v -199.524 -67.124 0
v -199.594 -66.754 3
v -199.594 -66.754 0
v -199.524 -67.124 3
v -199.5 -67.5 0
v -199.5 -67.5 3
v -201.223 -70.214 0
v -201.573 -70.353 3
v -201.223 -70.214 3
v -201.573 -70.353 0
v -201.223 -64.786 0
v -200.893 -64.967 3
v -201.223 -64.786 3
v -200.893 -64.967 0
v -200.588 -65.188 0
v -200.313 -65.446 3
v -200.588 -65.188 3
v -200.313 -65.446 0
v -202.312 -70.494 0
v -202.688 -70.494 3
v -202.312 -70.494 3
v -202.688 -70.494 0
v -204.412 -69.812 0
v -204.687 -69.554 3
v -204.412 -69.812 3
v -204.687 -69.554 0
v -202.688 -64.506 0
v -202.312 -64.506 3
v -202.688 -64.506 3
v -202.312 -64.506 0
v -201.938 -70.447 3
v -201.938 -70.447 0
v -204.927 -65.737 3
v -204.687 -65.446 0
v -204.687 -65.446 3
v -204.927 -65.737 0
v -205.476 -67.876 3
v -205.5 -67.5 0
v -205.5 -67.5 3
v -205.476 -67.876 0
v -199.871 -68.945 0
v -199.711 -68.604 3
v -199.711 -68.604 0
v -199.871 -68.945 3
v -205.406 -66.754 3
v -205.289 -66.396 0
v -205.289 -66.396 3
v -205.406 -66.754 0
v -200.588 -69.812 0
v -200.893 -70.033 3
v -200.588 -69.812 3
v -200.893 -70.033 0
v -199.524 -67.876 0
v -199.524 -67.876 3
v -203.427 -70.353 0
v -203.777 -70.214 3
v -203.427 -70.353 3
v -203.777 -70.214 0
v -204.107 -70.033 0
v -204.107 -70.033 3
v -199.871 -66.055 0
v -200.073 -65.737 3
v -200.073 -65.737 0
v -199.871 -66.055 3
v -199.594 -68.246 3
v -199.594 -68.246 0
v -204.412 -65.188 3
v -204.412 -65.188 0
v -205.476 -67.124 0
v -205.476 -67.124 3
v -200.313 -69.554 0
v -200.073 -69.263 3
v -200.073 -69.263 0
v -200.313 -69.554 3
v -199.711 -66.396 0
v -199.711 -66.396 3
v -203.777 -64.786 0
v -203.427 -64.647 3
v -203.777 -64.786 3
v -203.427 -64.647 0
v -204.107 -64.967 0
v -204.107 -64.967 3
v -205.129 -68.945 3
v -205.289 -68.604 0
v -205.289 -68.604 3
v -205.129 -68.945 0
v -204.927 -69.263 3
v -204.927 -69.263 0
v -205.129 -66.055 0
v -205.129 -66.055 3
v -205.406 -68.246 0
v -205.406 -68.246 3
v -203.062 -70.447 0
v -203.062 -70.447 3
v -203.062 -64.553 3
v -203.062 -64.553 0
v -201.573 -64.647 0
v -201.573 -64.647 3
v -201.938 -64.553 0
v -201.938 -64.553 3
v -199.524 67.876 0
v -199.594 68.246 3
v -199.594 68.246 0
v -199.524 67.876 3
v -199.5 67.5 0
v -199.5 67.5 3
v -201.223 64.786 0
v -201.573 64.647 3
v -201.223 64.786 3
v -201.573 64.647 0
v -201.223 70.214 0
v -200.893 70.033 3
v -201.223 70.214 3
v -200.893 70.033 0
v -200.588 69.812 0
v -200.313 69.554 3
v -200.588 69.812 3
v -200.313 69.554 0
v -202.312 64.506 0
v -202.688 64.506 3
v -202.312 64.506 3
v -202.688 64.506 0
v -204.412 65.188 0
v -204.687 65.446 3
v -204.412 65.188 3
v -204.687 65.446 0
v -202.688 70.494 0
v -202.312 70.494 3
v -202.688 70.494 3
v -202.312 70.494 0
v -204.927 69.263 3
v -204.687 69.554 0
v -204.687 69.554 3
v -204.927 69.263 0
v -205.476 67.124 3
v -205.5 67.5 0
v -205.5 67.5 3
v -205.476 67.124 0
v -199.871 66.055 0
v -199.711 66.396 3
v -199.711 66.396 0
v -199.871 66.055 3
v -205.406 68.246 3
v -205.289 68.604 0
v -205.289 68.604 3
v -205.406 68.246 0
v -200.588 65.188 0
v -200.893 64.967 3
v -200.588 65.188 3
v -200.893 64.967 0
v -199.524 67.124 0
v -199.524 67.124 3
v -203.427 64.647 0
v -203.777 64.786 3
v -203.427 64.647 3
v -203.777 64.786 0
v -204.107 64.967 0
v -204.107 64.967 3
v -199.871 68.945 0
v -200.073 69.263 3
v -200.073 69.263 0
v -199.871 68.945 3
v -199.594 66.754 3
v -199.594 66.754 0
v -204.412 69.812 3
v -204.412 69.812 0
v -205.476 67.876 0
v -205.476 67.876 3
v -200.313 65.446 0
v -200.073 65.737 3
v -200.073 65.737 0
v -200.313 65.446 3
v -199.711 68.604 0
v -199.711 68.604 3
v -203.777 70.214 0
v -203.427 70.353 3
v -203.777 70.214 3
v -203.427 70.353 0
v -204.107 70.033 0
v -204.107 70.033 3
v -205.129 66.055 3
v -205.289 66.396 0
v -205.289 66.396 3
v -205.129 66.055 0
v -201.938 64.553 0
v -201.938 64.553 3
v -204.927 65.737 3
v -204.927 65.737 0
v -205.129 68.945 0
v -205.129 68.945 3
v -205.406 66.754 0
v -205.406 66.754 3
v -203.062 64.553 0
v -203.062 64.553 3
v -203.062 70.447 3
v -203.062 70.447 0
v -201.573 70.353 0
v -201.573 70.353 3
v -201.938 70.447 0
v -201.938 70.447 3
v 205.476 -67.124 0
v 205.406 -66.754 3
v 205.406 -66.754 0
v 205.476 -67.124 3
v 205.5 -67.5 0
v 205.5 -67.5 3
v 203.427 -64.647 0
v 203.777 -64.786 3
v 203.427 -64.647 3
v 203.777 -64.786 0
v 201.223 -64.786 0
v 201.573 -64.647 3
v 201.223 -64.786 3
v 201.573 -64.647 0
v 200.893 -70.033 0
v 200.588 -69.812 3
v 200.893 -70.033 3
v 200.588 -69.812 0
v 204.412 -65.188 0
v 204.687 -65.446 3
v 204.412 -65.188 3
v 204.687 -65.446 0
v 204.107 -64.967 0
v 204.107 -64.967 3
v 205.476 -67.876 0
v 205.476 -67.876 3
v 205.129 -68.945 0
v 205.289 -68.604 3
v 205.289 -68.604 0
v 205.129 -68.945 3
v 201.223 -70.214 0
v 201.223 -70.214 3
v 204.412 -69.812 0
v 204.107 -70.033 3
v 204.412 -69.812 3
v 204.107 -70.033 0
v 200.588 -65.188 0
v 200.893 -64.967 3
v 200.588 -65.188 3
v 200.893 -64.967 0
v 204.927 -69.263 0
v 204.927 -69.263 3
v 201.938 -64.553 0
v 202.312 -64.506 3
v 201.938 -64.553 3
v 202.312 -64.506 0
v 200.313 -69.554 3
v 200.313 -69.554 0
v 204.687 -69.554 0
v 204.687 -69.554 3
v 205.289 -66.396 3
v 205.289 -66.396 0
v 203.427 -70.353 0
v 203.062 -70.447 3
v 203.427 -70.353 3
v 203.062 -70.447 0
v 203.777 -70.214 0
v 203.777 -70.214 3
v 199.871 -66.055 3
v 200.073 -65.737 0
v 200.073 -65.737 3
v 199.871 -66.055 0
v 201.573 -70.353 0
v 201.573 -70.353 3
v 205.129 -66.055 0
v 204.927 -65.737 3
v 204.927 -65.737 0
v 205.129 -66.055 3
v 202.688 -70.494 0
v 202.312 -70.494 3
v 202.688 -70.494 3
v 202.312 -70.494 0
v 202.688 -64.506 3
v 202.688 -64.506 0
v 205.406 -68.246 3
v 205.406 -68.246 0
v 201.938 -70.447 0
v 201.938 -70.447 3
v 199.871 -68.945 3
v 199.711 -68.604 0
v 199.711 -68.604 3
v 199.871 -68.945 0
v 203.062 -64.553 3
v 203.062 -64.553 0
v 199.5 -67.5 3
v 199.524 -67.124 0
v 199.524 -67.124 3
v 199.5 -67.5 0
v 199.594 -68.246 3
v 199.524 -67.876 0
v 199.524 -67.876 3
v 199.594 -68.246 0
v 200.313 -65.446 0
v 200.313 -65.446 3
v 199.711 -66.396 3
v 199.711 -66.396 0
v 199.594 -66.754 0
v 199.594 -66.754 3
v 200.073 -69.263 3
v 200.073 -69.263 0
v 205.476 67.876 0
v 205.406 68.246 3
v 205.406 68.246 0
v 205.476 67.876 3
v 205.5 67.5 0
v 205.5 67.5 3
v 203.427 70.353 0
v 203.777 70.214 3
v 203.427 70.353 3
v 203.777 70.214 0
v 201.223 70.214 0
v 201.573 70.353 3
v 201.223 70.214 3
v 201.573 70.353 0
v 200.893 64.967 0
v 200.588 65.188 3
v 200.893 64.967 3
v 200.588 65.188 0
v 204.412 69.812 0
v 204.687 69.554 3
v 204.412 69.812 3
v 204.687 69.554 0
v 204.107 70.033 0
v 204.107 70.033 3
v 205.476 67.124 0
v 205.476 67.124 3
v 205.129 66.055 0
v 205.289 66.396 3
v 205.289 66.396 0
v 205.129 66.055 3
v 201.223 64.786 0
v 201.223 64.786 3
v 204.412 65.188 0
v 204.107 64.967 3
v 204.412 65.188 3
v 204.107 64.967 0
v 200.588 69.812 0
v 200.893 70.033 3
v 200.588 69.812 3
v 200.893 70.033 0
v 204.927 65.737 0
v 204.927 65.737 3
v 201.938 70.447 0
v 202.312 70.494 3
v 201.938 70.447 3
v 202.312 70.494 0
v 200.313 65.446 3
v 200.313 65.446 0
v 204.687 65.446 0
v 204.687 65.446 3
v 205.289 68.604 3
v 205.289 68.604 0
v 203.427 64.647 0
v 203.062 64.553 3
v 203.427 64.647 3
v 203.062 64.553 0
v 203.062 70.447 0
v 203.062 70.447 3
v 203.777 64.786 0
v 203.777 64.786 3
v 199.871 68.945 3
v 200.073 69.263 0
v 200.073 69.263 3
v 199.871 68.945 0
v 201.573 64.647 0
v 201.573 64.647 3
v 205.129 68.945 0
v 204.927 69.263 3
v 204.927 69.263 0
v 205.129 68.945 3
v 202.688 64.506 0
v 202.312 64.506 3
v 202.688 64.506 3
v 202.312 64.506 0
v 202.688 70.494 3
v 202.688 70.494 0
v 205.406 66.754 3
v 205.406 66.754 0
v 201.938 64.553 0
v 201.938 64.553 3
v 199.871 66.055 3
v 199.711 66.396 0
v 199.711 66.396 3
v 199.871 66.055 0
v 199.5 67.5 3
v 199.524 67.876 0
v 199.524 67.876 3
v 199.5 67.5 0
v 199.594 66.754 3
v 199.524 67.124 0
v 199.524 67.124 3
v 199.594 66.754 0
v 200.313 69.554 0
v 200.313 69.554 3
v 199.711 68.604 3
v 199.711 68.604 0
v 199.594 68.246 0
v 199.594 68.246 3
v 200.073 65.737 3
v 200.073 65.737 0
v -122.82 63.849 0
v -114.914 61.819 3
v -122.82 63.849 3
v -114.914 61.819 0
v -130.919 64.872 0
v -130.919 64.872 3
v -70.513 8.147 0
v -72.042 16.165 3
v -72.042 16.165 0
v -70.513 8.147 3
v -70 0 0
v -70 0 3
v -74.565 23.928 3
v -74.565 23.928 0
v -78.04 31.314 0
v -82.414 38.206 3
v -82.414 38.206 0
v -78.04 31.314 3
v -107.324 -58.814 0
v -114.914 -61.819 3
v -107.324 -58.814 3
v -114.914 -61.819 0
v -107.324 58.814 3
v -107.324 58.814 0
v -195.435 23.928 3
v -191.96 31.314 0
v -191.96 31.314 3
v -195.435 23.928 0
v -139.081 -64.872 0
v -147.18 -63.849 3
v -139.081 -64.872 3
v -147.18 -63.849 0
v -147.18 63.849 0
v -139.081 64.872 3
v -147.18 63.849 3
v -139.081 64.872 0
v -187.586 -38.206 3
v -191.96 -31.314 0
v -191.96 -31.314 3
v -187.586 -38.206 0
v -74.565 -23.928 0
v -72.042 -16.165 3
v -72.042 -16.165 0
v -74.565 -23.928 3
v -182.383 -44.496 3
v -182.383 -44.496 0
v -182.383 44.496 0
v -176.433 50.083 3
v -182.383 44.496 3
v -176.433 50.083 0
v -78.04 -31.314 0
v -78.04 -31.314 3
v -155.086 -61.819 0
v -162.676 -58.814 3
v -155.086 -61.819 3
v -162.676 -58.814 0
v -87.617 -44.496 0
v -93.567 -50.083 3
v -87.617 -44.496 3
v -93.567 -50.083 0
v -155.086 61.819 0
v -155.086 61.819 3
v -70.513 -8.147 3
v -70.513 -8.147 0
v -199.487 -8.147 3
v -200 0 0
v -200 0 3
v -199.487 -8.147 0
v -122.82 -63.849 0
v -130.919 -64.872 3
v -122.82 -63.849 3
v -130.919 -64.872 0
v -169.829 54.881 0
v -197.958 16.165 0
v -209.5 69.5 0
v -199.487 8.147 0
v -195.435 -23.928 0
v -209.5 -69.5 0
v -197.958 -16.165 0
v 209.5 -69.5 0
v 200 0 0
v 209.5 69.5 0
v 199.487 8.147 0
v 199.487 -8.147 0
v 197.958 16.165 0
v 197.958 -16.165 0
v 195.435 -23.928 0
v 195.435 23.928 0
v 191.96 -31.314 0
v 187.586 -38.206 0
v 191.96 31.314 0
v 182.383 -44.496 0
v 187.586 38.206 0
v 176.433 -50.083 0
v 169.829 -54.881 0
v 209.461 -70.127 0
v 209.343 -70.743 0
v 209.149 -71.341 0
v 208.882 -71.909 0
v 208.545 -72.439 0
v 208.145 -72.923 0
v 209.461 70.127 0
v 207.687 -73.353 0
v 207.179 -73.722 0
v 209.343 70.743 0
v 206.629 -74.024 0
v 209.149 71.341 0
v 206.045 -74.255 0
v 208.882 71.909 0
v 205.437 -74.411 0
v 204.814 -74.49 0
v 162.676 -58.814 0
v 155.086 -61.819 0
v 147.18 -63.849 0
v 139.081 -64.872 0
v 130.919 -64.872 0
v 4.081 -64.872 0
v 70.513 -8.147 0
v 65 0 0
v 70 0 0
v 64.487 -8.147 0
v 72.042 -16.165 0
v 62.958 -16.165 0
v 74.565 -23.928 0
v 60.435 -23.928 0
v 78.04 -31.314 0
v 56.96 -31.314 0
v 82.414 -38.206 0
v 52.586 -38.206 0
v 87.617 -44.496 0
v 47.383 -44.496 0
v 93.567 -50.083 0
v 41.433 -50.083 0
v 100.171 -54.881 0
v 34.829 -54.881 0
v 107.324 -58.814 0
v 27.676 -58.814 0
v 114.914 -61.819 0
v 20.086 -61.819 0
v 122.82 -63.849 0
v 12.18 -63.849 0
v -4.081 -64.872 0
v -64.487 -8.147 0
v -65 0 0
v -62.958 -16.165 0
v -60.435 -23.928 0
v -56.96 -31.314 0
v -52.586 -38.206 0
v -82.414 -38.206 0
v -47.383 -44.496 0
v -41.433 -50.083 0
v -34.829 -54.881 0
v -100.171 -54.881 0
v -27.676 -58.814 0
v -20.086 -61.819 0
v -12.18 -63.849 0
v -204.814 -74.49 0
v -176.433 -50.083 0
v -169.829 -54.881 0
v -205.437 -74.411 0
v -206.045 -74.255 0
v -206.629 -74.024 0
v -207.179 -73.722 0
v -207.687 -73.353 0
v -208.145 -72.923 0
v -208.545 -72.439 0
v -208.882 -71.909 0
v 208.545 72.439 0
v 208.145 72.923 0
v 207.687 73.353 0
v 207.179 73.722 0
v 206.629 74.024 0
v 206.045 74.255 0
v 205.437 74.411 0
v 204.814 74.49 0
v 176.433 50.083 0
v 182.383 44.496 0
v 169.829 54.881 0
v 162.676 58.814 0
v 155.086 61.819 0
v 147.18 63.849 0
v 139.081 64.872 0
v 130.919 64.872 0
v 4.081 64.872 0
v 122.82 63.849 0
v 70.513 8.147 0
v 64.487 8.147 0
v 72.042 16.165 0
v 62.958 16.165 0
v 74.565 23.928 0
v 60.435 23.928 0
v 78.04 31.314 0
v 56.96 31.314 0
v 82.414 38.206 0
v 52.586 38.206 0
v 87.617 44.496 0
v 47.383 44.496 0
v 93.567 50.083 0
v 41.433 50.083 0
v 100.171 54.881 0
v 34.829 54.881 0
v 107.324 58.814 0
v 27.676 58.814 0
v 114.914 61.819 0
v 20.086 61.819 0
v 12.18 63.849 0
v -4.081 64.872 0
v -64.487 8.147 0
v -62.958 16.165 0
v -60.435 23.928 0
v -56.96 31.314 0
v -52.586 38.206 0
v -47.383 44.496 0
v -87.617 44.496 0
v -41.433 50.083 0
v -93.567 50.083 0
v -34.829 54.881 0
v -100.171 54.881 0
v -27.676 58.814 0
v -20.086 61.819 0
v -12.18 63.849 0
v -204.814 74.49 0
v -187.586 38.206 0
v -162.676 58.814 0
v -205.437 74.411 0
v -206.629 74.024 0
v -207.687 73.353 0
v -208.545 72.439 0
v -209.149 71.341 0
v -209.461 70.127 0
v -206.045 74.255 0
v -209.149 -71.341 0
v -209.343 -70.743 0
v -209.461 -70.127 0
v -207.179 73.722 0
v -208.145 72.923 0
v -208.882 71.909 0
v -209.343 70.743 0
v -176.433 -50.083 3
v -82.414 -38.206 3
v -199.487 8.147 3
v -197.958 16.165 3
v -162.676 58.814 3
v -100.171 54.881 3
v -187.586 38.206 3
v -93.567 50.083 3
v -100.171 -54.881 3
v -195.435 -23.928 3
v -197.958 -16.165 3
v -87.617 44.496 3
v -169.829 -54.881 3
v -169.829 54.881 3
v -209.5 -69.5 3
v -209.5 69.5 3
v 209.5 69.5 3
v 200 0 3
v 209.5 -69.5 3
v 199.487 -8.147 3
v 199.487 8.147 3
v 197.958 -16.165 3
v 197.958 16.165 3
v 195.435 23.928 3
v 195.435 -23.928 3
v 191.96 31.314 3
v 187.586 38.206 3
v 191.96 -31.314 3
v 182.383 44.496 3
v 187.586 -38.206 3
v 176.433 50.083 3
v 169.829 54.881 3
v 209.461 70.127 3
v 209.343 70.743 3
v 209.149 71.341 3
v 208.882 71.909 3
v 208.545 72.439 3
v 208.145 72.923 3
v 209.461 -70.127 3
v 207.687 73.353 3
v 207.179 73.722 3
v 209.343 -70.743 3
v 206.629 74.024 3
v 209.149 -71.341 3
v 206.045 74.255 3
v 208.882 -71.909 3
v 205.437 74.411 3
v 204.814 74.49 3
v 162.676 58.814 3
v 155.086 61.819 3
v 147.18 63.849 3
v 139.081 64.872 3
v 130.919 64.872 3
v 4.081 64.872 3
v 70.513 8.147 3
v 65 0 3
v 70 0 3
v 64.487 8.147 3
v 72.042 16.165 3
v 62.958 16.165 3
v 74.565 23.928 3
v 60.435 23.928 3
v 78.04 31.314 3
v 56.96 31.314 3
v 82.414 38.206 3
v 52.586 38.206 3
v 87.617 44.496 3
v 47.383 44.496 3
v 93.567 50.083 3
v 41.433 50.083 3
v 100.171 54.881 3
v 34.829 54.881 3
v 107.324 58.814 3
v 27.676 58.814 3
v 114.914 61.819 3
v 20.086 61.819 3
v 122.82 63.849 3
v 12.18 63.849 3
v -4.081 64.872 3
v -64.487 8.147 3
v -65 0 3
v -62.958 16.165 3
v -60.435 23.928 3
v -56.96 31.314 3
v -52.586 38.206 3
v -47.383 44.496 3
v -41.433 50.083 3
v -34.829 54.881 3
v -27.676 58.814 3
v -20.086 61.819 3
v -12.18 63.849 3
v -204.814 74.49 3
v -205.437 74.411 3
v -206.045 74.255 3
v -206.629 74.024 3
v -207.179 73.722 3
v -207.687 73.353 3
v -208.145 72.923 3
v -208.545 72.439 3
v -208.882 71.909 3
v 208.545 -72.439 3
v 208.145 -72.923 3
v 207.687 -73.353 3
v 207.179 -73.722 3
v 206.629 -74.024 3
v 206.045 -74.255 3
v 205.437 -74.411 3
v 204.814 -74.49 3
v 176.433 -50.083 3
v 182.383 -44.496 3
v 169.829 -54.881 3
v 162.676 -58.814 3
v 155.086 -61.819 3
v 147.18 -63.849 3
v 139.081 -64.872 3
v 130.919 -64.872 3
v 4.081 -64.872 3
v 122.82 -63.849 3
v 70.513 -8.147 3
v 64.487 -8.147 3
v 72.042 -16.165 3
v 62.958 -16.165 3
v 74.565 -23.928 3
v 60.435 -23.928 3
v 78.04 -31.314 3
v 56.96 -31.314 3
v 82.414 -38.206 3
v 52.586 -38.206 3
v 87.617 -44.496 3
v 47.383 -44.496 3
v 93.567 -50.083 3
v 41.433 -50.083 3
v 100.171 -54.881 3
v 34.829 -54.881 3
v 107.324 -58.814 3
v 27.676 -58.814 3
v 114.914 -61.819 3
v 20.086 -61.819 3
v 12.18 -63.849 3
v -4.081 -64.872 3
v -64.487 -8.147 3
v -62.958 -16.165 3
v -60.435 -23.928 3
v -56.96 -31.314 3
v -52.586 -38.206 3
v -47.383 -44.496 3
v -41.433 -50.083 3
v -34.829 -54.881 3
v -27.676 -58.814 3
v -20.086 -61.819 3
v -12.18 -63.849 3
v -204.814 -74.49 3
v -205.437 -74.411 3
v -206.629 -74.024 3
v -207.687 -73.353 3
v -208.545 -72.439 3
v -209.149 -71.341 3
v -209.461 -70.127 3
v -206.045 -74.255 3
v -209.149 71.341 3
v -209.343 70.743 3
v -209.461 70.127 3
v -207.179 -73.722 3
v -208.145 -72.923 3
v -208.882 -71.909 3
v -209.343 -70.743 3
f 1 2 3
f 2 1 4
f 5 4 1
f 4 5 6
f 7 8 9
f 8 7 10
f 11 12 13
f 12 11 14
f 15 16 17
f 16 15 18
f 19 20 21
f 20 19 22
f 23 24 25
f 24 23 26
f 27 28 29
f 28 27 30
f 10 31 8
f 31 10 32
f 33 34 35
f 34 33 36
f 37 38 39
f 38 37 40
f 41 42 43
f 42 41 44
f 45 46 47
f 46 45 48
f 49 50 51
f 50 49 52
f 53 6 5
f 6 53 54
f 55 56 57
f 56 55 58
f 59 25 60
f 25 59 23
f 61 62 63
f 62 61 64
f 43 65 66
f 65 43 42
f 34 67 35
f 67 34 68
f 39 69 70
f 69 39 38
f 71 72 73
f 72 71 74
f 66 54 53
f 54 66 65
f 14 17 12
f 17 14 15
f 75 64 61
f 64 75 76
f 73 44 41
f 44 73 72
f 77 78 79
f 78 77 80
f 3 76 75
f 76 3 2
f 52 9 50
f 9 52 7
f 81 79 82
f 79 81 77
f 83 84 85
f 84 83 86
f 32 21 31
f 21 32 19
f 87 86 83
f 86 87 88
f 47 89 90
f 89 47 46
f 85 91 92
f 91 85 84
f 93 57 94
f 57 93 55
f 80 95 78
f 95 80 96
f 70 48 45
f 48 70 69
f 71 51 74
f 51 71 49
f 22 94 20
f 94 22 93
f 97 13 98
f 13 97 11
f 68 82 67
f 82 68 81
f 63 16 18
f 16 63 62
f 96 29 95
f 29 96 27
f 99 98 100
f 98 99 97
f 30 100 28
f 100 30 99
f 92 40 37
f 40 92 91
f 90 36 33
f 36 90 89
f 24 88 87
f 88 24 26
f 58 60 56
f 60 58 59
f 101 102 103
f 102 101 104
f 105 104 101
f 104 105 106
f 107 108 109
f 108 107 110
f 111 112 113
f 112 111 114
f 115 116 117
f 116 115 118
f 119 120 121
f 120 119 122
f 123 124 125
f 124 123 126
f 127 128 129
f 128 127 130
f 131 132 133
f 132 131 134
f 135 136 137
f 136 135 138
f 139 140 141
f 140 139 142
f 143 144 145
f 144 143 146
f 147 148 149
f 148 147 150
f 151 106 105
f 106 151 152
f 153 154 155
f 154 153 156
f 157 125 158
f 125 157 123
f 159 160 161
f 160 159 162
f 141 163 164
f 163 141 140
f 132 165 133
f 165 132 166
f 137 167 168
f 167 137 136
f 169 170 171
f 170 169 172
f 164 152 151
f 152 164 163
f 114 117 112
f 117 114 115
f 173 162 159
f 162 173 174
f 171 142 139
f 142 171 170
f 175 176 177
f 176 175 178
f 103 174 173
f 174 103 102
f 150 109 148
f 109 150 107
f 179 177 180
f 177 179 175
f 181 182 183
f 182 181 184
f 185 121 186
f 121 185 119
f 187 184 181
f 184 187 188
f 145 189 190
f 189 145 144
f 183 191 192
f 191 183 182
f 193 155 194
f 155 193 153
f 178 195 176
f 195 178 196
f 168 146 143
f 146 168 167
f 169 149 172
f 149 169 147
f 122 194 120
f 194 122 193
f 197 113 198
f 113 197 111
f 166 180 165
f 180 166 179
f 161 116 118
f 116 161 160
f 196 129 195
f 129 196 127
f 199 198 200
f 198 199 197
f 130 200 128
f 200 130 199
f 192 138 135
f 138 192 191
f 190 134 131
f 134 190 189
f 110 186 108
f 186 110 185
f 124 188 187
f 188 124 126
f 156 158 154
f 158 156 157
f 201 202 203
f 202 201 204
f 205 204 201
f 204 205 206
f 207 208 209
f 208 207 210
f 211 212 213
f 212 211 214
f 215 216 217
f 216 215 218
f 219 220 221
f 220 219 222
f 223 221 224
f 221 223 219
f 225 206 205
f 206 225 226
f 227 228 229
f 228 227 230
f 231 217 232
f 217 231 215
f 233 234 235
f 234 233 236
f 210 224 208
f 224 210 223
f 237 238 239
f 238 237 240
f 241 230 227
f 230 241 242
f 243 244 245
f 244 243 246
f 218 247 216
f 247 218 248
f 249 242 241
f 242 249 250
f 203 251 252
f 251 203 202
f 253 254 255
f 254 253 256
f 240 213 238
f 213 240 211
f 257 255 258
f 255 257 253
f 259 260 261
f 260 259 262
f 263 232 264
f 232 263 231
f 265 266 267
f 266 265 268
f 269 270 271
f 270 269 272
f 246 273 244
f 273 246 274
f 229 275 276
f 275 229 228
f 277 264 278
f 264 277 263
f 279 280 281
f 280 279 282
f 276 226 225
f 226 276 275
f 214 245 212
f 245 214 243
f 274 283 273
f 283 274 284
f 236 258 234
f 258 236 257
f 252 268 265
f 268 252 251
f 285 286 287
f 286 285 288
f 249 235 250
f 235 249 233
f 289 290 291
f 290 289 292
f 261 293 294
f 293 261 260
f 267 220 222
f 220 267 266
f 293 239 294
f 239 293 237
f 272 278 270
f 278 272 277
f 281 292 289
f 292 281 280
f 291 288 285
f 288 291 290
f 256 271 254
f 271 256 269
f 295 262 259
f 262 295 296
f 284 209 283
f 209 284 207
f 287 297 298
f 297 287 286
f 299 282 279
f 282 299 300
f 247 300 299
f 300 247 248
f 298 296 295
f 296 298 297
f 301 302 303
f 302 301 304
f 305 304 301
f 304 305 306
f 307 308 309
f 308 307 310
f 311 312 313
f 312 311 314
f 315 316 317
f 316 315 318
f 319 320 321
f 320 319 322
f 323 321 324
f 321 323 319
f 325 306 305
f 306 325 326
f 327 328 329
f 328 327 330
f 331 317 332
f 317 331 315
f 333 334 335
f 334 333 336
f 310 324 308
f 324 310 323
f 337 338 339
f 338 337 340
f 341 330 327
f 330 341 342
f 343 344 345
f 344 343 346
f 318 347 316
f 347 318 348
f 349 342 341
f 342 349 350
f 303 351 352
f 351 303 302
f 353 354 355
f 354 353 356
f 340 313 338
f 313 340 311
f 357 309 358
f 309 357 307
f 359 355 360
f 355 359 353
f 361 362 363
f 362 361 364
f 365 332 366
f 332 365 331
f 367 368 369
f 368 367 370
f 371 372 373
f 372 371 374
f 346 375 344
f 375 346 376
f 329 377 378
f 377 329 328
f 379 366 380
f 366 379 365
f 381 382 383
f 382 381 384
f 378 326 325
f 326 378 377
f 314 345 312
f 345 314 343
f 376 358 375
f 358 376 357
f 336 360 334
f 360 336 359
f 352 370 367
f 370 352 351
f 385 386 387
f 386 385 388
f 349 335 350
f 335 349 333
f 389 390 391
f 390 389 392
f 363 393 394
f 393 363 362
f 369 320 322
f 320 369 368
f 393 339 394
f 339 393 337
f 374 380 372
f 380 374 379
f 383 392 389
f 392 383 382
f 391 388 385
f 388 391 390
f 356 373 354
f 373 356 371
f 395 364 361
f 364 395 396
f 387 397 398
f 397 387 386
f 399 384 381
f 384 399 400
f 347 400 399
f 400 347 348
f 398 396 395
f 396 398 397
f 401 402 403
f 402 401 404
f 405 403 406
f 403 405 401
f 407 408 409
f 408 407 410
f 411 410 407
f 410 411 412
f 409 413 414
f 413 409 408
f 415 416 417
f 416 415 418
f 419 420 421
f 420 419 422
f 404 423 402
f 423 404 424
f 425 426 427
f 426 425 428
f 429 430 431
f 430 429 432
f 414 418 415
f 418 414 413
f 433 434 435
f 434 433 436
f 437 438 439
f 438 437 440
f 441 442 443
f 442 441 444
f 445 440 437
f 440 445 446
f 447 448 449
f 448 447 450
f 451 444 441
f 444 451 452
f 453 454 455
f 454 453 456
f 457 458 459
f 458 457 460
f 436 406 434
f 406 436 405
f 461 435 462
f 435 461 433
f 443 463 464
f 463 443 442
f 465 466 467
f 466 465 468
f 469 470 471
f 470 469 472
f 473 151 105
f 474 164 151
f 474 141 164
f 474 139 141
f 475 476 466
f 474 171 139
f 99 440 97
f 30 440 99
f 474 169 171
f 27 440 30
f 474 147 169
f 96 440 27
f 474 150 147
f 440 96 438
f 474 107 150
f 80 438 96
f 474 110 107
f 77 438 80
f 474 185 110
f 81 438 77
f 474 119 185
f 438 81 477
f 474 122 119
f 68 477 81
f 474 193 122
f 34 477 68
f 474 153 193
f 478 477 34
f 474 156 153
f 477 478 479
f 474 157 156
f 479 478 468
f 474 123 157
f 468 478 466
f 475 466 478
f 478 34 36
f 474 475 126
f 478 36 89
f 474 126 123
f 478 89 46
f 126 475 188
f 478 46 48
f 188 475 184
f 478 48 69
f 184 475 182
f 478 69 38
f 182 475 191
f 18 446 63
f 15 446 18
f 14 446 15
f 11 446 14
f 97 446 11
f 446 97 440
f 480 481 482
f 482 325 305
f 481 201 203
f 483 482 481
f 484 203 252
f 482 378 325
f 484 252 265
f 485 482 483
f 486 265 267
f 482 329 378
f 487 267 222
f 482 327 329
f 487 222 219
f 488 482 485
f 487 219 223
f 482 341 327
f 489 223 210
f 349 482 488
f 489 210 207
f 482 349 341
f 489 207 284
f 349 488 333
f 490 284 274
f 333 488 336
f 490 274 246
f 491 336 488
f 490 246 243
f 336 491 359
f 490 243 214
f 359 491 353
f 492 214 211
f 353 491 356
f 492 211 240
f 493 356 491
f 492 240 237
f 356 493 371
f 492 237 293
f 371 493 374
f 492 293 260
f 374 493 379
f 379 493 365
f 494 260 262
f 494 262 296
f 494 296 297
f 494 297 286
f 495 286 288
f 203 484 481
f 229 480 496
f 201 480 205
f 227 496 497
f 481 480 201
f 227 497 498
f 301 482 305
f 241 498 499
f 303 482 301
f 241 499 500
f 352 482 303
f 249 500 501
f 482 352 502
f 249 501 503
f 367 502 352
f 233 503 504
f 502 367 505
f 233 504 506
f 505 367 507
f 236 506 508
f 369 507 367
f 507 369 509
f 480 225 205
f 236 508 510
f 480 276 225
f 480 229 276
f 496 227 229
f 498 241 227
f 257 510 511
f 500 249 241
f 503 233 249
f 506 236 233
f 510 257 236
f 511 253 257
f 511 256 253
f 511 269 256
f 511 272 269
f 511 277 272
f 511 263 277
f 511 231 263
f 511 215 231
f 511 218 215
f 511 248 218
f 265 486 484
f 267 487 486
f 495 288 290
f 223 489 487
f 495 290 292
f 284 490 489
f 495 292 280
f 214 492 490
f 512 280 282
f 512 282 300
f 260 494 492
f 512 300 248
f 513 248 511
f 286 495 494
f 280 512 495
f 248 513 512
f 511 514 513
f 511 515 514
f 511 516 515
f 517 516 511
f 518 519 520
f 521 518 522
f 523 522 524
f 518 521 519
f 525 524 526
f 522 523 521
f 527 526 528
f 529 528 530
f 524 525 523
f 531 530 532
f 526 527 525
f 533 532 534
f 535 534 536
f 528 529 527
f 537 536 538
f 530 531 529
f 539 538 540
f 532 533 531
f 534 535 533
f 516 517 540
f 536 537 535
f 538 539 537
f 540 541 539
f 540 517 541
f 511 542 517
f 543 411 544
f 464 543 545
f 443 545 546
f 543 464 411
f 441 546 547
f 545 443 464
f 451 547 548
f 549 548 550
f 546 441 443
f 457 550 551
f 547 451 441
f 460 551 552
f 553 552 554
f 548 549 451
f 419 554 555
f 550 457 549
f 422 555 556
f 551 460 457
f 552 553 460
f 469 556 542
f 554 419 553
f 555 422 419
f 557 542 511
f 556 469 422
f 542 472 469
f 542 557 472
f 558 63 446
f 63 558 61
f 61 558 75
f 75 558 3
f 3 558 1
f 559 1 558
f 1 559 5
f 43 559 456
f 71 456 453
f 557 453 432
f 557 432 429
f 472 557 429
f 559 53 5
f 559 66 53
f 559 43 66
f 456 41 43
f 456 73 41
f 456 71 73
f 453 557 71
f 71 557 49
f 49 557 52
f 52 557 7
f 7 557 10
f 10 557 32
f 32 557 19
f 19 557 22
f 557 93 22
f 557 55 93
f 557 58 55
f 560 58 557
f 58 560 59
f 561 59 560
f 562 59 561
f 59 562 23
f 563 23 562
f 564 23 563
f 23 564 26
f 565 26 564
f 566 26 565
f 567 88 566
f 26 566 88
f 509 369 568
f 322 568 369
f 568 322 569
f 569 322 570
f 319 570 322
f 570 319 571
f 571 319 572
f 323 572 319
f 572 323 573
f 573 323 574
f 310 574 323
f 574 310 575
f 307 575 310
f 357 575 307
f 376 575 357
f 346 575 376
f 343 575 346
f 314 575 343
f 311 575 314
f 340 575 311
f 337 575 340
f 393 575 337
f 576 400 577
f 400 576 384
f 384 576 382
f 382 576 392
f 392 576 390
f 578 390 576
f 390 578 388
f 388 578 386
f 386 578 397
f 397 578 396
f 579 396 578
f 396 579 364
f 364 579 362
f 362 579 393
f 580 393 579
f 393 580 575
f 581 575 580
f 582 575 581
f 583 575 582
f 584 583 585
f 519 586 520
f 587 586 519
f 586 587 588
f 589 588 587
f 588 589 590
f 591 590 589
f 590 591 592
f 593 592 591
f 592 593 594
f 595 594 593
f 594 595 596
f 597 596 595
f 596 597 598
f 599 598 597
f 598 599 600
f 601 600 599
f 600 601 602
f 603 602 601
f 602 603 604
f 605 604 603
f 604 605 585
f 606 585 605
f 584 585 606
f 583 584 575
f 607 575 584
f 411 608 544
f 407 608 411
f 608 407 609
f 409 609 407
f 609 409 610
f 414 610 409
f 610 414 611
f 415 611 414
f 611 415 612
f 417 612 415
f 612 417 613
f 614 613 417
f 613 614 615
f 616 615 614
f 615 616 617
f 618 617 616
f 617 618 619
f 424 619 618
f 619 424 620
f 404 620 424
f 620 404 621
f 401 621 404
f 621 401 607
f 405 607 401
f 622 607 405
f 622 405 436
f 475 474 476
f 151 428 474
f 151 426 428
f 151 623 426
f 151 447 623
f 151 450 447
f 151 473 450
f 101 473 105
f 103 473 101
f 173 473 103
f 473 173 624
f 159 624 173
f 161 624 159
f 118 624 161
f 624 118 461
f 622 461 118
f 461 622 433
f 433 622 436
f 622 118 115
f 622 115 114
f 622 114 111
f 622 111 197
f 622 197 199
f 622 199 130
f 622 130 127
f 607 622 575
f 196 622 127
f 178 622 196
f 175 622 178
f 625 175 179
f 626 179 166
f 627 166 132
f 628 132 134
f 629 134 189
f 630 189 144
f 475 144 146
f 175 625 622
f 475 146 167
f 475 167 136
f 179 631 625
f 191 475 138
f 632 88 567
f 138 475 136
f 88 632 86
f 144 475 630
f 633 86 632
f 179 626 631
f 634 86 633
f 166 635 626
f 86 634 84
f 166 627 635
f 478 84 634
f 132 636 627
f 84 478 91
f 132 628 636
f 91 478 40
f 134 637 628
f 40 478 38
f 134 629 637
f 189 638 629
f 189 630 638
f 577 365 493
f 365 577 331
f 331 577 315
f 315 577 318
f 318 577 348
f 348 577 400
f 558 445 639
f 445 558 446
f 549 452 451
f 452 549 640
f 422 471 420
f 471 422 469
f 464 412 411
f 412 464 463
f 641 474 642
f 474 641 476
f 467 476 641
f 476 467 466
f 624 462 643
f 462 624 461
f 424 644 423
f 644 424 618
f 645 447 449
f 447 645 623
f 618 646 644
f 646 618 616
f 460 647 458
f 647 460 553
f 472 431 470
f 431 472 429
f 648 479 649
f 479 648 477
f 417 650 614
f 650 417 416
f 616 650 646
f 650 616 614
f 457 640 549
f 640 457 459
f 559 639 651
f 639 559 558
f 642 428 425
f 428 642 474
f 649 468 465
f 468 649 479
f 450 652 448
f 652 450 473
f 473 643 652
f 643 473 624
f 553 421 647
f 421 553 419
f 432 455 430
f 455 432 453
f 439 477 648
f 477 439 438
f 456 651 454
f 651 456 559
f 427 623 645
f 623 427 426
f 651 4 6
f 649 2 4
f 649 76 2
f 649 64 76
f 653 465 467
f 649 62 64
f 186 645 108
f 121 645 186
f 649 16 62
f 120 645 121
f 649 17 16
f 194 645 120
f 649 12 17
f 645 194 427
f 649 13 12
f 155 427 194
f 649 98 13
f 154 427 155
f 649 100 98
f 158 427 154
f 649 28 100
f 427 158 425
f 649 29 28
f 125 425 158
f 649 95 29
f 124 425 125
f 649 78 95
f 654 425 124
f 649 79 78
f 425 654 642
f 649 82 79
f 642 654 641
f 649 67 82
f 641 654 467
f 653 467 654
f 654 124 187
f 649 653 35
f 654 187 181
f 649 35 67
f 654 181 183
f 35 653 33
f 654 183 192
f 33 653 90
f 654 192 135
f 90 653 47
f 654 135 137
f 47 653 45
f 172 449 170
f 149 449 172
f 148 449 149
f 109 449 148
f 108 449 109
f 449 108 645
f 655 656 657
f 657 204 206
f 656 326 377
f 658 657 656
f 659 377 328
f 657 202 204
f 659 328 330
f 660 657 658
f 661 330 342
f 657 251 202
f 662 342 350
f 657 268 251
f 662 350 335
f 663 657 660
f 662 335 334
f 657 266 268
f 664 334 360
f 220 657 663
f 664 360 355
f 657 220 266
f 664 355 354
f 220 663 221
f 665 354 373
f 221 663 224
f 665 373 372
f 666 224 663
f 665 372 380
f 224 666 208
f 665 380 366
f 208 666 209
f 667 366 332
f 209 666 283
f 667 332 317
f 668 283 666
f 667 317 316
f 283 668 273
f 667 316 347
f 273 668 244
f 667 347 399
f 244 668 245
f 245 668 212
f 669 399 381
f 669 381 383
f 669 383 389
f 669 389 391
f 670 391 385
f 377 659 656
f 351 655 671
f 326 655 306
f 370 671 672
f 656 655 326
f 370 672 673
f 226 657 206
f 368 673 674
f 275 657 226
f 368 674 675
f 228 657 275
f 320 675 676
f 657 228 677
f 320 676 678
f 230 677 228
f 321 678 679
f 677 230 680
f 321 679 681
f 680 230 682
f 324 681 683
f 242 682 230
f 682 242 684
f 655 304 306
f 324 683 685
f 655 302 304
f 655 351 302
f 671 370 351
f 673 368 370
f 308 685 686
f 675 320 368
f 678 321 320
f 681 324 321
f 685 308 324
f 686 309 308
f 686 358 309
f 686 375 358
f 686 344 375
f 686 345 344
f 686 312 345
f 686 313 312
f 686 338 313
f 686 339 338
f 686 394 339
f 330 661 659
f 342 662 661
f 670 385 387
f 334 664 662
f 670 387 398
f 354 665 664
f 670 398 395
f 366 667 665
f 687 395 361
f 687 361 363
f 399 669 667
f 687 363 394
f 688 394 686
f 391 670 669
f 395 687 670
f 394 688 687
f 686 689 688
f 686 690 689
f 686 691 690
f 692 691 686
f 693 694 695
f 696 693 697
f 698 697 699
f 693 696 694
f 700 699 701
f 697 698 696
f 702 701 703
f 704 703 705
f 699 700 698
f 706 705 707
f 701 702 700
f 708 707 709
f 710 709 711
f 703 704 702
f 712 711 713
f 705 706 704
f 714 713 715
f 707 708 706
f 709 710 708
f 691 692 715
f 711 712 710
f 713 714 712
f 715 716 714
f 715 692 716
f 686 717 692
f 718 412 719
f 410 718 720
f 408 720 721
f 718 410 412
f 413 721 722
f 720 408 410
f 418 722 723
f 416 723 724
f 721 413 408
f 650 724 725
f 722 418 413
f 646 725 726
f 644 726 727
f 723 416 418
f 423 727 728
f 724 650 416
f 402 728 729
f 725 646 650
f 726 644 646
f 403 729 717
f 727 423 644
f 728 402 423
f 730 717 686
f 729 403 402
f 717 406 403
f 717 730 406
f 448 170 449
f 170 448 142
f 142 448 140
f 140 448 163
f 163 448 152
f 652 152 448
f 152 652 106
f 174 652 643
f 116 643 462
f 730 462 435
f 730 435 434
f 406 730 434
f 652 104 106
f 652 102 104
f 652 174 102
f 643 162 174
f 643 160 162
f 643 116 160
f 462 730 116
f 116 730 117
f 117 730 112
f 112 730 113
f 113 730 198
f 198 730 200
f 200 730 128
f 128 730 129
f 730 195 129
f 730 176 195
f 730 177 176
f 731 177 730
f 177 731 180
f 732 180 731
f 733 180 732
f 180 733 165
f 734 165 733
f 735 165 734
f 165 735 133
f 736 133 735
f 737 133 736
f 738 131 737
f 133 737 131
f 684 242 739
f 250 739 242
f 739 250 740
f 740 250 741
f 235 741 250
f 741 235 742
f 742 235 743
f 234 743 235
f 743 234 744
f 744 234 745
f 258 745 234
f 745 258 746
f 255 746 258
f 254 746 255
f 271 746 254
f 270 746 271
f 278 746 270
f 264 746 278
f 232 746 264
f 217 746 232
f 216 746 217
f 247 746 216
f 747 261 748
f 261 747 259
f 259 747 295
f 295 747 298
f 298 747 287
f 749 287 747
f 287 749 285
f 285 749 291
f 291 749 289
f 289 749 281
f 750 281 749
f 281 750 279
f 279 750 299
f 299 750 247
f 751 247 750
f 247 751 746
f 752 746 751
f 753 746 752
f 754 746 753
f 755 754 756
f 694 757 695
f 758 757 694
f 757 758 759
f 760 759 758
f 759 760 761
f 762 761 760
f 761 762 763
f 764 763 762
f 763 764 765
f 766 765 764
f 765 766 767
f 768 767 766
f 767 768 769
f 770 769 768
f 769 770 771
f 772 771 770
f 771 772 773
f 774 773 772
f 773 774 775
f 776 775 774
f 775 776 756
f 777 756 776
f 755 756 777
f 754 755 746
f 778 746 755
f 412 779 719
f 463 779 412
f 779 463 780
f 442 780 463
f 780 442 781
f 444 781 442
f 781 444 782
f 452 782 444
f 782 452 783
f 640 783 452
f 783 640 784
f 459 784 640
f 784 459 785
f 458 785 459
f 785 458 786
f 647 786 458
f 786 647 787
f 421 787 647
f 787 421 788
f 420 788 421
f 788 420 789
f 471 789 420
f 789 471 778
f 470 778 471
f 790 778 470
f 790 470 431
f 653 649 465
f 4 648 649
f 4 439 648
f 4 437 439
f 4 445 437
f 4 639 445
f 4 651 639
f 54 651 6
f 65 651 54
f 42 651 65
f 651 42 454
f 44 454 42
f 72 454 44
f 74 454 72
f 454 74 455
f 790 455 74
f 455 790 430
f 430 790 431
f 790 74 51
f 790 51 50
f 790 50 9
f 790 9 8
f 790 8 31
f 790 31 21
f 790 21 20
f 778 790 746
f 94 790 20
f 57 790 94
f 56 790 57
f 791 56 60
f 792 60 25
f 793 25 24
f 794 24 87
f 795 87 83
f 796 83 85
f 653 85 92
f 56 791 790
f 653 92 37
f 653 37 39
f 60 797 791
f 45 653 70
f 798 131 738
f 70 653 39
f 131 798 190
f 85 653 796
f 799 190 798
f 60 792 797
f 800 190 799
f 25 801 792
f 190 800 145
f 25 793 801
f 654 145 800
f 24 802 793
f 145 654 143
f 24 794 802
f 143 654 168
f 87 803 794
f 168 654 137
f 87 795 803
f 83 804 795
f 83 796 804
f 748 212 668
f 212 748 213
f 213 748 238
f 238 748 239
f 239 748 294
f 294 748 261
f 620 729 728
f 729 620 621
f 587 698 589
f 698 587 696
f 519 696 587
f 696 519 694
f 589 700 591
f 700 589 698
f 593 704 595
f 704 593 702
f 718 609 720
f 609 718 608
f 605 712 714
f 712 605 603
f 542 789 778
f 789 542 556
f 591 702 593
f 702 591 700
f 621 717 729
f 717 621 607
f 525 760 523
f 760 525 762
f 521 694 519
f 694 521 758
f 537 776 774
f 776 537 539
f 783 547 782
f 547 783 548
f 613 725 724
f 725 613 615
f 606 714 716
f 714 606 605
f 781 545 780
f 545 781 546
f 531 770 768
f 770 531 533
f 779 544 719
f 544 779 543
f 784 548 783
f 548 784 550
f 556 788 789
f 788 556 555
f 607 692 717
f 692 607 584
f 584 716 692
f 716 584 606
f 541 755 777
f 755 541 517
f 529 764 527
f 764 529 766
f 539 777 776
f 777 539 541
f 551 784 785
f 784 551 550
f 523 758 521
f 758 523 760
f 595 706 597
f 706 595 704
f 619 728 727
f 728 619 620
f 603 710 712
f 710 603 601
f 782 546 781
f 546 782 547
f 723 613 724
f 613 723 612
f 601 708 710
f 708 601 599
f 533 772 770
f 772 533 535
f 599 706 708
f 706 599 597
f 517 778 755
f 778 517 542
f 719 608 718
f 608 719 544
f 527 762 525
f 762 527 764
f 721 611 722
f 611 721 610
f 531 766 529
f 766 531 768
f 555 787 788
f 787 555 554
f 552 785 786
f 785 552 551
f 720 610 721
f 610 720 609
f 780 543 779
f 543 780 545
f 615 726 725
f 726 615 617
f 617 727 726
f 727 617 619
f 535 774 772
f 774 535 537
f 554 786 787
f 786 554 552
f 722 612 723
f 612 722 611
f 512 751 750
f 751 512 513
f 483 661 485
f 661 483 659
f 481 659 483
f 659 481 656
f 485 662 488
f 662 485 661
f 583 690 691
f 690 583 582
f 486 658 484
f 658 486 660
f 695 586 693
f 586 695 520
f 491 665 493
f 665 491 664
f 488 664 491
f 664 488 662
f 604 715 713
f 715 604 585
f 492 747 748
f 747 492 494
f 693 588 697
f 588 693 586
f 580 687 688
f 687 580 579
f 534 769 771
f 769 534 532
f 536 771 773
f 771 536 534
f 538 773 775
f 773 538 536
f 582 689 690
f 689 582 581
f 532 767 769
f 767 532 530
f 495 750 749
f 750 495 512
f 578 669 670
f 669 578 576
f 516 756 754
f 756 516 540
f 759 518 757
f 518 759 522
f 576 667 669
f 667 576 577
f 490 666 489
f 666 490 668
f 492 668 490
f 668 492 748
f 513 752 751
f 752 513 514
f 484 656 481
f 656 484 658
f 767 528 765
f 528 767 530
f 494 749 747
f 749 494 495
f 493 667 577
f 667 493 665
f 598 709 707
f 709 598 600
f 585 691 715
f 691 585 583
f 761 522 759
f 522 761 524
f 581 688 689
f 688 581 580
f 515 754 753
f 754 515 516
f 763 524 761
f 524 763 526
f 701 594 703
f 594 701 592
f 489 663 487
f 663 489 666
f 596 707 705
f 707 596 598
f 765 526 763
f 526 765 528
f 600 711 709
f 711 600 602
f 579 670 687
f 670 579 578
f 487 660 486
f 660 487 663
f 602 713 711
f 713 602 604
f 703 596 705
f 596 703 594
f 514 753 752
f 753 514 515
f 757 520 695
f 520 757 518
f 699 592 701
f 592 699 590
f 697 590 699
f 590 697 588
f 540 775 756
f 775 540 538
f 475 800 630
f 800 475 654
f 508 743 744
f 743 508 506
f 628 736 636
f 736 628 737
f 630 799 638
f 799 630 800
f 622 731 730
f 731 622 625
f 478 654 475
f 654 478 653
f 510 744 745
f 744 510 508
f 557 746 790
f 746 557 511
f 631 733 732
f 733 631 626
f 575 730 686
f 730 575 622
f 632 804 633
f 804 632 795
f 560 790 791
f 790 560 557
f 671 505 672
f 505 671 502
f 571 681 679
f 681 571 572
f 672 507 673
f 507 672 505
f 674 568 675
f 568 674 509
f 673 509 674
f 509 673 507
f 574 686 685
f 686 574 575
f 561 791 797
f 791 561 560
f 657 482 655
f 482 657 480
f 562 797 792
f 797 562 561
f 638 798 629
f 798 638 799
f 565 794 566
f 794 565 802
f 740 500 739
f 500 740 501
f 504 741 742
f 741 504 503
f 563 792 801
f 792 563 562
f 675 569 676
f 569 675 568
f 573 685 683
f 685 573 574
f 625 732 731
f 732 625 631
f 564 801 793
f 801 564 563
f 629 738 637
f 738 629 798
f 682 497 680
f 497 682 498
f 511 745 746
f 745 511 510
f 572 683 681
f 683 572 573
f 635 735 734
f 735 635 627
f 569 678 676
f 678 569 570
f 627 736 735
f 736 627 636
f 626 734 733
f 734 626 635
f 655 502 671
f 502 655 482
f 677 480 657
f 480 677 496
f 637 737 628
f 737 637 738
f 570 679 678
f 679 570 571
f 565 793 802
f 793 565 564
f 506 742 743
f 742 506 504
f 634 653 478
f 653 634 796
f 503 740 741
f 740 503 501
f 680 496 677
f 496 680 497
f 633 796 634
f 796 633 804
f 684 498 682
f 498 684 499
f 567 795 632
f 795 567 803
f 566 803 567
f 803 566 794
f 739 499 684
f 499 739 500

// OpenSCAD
$fn = 50;


difference() {
	union() {
		hull() {
			translate(v = [-204.5000000000, 69.5000000000, 0]) {
				cylinder(h = 3, r = 5);
			}
			translate(v = [204.5000000000, 69.5000000000, 0]) {
				cylinder(h = 3, r = 5);
			}
			translate(v = [-204.5000000000, -69.5000000000, 0]) {
				cylinder(h = 3, r = 5);
			}
			translate(v = [204.5000000000, -69.5000000000, 0]) {
				cylinder(h = 3, r = 5);
			}
		}
	}
	union() {
		#translate(v = [-202.5000000000, -67.5000000000, -100.0000000000]) {
			cylinder(h = 200, r = 3.0000000000);
		}
		#translate(v = [-202.5000000000, 67.5000000000, -100.0000000000]) {
			cylinder(h = 200, r = 3.0000000000);
		}
		#translate(v = [202.5000000000, -67.5000000000, -100.0000000000]) {
			cylinder(h = 200, r = 3.0000000000);
		}
		#translate(v = [202.5000000000, 67.5000000000, -100.0000000000]) {
			cylinder(h = 200, r = 3.0000000000);
		}
		#translate(v = [-135.0000000000, 0, 0]) {
			cylinder(h = 3, r = 65.0000000000);
		}
		#cylinder(h = 3, r = 65.0000000000);
		#translate(v = [135.0000000000, 0, 0]) {
			cylinder(h = 3, r = 65.0000000000);
		}
	}
}
